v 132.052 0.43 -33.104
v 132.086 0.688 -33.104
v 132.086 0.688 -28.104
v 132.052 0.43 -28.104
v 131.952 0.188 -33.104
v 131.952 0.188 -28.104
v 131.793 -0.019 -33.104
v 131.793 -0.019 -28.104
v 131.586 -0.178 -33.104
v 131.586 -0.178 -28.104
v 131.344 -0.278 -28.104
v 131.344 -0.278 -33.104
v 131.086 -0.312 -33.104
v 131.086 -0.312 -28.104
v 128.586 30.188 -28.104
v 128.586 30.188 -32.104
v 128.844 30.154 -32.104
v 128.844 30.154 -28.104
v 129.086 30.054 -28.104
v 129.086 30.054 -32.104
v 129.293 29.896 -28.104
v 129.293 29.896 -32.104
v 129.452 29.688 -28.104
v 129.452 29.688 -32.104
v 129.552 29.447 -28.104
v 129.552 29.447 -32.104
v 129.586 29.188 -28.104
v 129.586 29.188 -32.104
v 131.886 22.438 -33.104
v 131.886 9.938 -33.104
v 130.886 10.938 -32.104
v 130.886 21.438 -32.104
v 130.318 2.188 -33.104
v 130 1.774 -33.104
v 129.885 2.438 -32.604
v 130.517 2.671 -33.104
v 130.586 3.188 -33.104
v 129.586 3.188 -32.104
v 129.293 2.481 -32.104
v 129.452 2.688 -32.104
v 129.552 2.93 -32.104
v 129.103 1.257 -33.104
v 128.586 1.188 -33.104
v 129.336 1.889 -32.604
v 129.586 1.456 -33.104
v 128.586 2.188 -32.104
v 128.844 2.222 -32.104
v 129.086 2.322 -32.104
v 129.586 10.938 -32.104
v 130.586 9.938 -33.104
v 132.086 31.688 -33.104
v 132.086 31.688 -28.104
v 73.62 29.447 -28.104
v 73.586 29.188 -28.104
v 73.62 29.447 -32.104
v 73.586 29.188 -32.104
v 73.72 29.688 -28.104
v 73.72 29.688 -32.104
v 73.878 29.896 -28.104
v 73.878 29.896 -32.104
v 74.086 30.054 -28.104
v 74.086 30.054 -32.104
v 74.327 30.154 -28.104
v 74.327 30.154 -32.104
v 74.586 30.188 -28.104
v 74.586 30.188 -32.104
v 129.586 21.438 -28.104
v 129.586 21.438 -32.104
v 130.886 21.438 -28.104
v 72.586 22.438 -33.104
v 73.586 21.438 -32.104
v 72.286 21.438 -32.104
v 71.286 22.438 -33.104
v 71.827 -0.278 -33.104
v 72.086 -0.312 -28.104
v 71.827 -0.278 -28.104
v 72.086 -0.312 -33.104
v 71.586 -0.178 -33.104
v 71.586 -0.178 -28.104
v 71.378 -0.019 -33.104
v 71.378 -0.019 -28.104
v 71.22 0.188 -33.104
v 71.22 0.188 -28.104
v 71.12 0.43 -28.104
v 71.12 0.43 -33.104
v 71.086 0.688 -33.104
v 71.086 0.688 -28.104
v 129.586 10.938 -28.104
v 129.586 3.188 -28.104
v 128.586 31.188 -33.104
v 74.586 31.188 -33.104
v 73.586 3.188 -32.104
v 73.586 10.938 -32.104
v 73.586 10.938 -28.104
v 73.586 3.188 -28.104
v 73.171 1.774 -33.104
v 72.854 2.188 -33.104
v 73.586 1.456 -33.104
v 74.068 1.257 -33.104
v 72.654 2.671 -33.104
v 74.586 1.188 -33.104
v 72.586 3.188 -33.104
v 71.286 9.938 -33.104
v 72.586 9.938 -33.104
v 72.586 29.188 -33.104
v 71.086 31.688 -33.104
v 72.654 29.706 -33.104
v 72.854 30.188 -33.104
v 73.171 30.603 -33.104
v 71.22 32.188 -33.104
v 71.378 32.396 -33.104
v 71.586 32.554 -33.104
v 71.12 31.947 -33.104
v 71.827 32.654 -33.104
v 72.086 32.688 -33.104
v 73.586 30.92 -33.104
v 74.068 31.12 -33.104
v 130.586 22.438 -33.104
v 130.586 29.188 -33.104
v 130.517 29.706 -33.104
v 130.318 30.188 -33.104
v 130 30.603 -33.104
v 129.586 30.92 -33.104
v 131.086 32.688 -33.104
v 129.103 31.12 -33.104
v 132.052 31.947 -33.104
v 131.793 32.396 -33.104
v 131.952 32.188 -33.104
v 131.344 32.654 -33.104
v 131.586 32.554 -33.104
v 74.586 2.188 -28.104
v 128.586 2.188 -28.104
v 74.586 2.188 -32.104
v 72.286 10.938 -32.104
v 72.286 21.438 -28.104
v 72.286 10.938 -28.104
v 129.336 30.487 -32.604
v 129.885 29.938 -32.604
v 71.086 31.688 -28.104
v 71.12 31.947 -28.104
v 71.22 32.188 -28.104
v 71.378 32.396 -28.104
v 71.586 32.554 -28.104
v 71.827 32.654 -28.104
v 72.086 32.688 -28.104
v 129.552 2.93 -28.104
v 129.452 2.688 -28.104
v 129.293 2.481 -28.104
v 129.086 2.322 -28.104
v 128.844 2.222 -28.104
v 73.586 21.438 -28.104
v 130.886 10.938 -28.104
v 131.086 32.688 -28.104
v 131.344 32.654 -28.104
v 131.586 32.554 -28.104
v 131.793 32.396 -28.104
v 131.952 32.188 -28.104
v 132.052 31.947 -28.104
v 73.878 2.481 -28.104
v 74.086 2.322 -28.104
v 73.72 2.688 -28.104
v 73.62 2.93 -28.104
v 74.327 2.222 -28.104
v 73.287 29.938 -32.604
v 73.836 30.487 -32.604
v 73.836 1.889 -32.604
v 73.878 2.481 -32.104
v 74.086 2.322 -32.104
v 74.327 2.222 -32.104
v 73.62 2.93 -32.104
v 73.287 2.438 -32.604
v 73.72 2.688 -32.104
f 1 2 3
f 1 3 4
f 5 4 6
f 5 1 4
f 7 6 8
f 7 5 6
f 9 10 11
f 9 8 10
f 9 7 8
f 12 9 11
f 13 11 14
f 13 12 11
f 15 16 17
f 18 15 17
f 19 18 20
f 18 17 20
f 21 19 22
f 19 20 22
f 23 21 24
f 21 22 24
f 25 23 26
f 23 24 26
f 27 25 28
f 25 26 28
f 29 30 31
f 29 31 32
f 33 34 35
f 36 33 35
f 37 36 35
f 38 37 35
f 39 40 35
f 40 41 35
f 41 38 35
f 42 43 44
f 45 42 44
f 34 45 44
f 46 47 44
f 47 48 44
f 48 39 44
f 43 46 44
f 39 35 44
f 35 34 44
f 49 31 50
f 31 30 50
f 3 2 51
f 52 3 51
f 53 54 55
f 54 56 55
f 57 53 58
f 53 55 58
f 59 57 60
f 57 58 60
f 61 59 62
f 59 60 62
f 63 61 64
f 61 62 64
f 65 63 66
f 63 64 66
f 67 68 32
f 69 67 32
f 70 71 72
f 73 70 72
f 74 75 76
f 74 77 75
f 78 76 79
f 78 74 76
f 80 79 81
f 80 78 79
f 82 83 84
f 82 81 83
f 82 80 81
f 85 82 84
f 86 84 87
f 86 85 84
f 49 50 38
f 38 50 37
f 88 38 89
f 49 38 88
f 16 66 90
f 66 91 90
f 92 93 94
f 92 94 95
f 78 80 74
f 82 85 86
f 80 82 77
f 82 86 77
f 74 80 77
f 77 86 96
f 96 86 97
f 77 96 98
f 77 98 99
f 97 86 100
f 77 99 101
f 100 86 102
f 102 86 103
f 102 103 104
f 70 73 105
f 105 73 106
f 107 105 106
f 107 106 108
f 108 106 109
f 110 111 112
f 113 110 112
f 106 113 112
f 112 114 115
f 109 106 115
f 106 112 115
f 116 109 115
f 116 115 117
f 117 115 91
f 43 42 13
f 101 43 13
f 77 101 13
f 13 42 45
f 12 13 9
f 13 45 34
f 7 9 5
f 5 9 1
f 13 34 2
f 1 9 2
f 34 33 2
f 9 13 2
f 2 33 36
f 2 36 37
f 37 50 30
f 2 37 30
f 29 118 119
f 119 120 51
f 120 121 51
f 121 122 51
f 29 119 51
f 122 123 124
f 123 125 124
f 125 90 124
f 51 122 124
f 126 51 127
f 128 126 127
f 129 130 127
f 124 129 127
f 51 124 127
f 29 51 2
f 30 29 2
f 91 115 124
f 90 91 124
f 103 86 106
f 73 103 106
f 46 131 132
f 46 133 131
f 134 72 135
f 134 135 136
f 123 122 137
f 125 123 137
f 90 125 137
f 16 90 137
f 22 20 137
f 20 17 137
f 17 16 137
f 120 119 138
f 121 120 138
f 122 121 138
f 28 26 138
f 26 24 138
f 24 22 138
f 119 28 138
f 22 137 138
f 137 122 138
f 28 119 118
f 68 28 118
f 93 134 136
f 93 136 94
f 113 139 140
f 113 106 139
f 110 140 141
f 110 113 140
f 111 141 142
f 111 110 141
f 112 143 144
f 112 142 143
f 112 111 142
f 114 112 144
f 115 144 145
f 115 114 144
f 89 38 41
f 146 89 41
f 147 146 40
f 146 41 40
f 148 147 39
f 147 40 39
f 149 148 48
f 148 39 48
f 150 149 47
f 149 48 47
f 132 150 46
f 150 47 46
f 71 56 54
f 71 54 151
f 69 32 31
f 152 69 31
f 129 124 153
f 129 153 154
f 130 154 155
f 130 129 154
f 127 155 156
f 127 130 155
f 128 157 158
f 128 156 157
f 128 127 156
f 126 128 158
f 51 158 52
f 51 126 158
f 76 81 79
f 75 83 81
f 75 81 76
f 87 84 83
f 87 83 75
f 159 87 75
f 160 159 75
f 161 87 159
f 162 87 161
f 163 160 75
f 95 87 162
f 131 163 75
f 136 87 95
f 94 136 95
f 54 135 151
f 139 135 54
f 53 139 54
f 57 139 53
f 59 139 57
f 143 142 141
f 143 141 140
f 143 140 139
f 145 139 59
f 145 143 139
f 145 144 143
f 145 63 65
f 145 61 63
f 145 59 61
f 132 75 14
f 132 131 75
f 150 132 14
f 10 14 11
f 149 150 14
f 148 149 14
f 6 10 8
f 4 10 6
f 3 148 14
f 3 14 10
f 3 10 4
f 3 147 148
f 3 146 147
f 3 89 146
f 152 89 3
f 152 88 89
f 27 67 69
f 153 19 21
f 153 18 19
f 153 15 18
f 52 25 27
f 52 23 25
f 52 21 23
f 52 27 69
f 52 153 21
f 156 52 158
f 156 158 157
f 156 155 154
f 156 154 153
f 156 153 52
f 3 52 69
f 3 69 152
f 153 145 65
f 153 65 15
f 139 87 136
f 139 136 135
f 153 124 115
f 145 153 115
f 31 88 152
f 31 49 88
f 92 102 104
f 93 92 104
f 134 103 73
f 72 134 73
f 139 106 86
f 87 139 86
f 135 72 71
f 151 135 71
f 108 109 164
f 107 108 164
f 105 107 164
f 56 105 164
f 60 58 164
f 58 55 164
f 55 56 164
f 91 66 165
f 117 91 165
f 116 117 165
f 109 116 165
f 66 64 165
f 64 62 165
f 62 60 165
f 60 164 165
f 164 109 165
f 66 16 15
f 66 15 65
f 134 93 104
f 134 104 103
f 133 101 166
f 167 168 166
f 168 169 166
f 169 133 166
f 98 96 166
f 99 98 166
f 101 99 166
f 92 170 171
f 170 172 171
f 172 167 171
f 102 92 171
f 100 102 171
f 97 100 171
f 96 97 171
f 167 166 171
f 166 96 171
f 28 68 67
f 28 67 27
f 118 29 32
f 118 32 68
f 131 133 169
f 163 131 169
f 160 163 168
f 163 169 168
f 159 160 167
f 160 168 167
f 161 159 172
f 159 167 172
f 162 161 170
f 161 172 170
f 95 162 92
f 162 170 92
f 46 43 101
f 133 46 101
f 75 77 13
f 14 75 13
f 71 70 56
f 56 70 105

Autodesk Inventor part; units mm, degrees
ref_plane "YZ Plane" through (0, 0, 0) normal (1, 0, 0) x (0, 1, 0)
ref_plane "XZ Plane" through (0, 0, 0) normal (0, 1, 0) x (-1, 0, 0)
ref_plane "XY Plane" through (0, 0, 0) normal (0, 0, 1) x (1, 0, 0)
ref_plane "Work Plane1" through (0, 0, -12) normal (0, 0, 1) x (1, 0, 0)
ref_plane "Work Plane2" through (101.5856, 16.1884, -33.1044) normal (0, 0, 1) x (1, 0, 0)
sketch "Sketch2" plane through (101.5856, 16.1884, -33.1044) normal (0, 0, 1) x (1, 0, 0)
  line L0 (30.5, -15.5) -> (30.5, 15.5) projected
  arc A0 (30.5, 15.5) -> (29.5, 16.5) centre (29.5, 15.5) ccw projected
  line L1 (29.5, 16.5) -> (-29.5, 16.5) projected
  arc A1 (-29.5, 16.5) -> (-30.5, 15.5) centre (-29.5, 15.5) ccw projected
  line L2 (-30.5, 15.5) -> (-30.5, -15.5) projected
  arc A2 (-30.5, -15.5) -> (-29.5, -16.5) centre (-29.5, -15.5) ccw projected
  line L3 (-29.5, -16.5) -> (29.5, -16.5) projected
  arc A3 (29.5, -16.5) -> (30.5, -15.5) centre (29.5, -15.5) ccw projected
  line L4 (-28, 13) -> (-28, -13) projected
  arc A4 (-27, 14) -> (-28, 13) centre (-27, 13) ccw projected
  line L5 (27, 14) -> (-27, 14) projected
  arc A5 (28, 13) -> (27, 14) centre (27, 13) ccw projected
  line L6 (28, -13) -> (28, 13) projected
  arc A6 (27, -14) -> (28, -13) centre (27, -13) ccw projected
  line L7 (-27, -14) -> (27, -14) projected
  arc A7 (-28, -13) -> (-27, -14) centre (-27, -13) ccw projected
  line L8 (-29.3, 5.25) -> (-29.3, -5.25) projected
  line L9 (-29.3, -5.25) -> (-28, -5.25) projected
  line L10 (-28, 5.25) -> (-28, -5.25) projected
  line L11 (-29.3, 5.25) -> (-28, 5.25) projected
  line L12 (28, 5.25) -> (28, -5.25) projected
  line L13 (28, -5.25) -> (29.3, -5.25) projected
  line L14 (29.3, 5.25) -> (29.3, -5.25) projected
  line L15 (28, 5.25) -> (29.3, 5.25) projected
  point P0 (-101.5856, -16.1884)
extrude "Extrusion2" add sketch "Sketch2" along normal blind 5
chamfer "Chamfer2" distance 1 angle 45 16 edges at (101.5856, 30.1884, -33.1044) (129.2927, 29.8955, -33.1044) (129.5856, 25.3134, -33.1044) (73.8785, 29.8955, -33.1044) (73.5856, 25.3134, -33.1044) (101.5856, 2.1884, -33.1044) (73.8785, 2.4813, -33.1044) (73.5856, 7.0634, -33.1044) (129.2927, 2.4813, -33.1044) (129.5856, 7.0634, -33.1044) (130.2356, 21.4384, -33.1044) (130.2356, 10.9384, -33.1044) (130.8856, 16.1884, -33.1044) (72.9356, 21.4384, -33.1044) (72.2856, 16.1884, -33.1044) (72.9356, 10.9384, -33.1044)
properties part number "ledy_bateryjki_ramka_check"
